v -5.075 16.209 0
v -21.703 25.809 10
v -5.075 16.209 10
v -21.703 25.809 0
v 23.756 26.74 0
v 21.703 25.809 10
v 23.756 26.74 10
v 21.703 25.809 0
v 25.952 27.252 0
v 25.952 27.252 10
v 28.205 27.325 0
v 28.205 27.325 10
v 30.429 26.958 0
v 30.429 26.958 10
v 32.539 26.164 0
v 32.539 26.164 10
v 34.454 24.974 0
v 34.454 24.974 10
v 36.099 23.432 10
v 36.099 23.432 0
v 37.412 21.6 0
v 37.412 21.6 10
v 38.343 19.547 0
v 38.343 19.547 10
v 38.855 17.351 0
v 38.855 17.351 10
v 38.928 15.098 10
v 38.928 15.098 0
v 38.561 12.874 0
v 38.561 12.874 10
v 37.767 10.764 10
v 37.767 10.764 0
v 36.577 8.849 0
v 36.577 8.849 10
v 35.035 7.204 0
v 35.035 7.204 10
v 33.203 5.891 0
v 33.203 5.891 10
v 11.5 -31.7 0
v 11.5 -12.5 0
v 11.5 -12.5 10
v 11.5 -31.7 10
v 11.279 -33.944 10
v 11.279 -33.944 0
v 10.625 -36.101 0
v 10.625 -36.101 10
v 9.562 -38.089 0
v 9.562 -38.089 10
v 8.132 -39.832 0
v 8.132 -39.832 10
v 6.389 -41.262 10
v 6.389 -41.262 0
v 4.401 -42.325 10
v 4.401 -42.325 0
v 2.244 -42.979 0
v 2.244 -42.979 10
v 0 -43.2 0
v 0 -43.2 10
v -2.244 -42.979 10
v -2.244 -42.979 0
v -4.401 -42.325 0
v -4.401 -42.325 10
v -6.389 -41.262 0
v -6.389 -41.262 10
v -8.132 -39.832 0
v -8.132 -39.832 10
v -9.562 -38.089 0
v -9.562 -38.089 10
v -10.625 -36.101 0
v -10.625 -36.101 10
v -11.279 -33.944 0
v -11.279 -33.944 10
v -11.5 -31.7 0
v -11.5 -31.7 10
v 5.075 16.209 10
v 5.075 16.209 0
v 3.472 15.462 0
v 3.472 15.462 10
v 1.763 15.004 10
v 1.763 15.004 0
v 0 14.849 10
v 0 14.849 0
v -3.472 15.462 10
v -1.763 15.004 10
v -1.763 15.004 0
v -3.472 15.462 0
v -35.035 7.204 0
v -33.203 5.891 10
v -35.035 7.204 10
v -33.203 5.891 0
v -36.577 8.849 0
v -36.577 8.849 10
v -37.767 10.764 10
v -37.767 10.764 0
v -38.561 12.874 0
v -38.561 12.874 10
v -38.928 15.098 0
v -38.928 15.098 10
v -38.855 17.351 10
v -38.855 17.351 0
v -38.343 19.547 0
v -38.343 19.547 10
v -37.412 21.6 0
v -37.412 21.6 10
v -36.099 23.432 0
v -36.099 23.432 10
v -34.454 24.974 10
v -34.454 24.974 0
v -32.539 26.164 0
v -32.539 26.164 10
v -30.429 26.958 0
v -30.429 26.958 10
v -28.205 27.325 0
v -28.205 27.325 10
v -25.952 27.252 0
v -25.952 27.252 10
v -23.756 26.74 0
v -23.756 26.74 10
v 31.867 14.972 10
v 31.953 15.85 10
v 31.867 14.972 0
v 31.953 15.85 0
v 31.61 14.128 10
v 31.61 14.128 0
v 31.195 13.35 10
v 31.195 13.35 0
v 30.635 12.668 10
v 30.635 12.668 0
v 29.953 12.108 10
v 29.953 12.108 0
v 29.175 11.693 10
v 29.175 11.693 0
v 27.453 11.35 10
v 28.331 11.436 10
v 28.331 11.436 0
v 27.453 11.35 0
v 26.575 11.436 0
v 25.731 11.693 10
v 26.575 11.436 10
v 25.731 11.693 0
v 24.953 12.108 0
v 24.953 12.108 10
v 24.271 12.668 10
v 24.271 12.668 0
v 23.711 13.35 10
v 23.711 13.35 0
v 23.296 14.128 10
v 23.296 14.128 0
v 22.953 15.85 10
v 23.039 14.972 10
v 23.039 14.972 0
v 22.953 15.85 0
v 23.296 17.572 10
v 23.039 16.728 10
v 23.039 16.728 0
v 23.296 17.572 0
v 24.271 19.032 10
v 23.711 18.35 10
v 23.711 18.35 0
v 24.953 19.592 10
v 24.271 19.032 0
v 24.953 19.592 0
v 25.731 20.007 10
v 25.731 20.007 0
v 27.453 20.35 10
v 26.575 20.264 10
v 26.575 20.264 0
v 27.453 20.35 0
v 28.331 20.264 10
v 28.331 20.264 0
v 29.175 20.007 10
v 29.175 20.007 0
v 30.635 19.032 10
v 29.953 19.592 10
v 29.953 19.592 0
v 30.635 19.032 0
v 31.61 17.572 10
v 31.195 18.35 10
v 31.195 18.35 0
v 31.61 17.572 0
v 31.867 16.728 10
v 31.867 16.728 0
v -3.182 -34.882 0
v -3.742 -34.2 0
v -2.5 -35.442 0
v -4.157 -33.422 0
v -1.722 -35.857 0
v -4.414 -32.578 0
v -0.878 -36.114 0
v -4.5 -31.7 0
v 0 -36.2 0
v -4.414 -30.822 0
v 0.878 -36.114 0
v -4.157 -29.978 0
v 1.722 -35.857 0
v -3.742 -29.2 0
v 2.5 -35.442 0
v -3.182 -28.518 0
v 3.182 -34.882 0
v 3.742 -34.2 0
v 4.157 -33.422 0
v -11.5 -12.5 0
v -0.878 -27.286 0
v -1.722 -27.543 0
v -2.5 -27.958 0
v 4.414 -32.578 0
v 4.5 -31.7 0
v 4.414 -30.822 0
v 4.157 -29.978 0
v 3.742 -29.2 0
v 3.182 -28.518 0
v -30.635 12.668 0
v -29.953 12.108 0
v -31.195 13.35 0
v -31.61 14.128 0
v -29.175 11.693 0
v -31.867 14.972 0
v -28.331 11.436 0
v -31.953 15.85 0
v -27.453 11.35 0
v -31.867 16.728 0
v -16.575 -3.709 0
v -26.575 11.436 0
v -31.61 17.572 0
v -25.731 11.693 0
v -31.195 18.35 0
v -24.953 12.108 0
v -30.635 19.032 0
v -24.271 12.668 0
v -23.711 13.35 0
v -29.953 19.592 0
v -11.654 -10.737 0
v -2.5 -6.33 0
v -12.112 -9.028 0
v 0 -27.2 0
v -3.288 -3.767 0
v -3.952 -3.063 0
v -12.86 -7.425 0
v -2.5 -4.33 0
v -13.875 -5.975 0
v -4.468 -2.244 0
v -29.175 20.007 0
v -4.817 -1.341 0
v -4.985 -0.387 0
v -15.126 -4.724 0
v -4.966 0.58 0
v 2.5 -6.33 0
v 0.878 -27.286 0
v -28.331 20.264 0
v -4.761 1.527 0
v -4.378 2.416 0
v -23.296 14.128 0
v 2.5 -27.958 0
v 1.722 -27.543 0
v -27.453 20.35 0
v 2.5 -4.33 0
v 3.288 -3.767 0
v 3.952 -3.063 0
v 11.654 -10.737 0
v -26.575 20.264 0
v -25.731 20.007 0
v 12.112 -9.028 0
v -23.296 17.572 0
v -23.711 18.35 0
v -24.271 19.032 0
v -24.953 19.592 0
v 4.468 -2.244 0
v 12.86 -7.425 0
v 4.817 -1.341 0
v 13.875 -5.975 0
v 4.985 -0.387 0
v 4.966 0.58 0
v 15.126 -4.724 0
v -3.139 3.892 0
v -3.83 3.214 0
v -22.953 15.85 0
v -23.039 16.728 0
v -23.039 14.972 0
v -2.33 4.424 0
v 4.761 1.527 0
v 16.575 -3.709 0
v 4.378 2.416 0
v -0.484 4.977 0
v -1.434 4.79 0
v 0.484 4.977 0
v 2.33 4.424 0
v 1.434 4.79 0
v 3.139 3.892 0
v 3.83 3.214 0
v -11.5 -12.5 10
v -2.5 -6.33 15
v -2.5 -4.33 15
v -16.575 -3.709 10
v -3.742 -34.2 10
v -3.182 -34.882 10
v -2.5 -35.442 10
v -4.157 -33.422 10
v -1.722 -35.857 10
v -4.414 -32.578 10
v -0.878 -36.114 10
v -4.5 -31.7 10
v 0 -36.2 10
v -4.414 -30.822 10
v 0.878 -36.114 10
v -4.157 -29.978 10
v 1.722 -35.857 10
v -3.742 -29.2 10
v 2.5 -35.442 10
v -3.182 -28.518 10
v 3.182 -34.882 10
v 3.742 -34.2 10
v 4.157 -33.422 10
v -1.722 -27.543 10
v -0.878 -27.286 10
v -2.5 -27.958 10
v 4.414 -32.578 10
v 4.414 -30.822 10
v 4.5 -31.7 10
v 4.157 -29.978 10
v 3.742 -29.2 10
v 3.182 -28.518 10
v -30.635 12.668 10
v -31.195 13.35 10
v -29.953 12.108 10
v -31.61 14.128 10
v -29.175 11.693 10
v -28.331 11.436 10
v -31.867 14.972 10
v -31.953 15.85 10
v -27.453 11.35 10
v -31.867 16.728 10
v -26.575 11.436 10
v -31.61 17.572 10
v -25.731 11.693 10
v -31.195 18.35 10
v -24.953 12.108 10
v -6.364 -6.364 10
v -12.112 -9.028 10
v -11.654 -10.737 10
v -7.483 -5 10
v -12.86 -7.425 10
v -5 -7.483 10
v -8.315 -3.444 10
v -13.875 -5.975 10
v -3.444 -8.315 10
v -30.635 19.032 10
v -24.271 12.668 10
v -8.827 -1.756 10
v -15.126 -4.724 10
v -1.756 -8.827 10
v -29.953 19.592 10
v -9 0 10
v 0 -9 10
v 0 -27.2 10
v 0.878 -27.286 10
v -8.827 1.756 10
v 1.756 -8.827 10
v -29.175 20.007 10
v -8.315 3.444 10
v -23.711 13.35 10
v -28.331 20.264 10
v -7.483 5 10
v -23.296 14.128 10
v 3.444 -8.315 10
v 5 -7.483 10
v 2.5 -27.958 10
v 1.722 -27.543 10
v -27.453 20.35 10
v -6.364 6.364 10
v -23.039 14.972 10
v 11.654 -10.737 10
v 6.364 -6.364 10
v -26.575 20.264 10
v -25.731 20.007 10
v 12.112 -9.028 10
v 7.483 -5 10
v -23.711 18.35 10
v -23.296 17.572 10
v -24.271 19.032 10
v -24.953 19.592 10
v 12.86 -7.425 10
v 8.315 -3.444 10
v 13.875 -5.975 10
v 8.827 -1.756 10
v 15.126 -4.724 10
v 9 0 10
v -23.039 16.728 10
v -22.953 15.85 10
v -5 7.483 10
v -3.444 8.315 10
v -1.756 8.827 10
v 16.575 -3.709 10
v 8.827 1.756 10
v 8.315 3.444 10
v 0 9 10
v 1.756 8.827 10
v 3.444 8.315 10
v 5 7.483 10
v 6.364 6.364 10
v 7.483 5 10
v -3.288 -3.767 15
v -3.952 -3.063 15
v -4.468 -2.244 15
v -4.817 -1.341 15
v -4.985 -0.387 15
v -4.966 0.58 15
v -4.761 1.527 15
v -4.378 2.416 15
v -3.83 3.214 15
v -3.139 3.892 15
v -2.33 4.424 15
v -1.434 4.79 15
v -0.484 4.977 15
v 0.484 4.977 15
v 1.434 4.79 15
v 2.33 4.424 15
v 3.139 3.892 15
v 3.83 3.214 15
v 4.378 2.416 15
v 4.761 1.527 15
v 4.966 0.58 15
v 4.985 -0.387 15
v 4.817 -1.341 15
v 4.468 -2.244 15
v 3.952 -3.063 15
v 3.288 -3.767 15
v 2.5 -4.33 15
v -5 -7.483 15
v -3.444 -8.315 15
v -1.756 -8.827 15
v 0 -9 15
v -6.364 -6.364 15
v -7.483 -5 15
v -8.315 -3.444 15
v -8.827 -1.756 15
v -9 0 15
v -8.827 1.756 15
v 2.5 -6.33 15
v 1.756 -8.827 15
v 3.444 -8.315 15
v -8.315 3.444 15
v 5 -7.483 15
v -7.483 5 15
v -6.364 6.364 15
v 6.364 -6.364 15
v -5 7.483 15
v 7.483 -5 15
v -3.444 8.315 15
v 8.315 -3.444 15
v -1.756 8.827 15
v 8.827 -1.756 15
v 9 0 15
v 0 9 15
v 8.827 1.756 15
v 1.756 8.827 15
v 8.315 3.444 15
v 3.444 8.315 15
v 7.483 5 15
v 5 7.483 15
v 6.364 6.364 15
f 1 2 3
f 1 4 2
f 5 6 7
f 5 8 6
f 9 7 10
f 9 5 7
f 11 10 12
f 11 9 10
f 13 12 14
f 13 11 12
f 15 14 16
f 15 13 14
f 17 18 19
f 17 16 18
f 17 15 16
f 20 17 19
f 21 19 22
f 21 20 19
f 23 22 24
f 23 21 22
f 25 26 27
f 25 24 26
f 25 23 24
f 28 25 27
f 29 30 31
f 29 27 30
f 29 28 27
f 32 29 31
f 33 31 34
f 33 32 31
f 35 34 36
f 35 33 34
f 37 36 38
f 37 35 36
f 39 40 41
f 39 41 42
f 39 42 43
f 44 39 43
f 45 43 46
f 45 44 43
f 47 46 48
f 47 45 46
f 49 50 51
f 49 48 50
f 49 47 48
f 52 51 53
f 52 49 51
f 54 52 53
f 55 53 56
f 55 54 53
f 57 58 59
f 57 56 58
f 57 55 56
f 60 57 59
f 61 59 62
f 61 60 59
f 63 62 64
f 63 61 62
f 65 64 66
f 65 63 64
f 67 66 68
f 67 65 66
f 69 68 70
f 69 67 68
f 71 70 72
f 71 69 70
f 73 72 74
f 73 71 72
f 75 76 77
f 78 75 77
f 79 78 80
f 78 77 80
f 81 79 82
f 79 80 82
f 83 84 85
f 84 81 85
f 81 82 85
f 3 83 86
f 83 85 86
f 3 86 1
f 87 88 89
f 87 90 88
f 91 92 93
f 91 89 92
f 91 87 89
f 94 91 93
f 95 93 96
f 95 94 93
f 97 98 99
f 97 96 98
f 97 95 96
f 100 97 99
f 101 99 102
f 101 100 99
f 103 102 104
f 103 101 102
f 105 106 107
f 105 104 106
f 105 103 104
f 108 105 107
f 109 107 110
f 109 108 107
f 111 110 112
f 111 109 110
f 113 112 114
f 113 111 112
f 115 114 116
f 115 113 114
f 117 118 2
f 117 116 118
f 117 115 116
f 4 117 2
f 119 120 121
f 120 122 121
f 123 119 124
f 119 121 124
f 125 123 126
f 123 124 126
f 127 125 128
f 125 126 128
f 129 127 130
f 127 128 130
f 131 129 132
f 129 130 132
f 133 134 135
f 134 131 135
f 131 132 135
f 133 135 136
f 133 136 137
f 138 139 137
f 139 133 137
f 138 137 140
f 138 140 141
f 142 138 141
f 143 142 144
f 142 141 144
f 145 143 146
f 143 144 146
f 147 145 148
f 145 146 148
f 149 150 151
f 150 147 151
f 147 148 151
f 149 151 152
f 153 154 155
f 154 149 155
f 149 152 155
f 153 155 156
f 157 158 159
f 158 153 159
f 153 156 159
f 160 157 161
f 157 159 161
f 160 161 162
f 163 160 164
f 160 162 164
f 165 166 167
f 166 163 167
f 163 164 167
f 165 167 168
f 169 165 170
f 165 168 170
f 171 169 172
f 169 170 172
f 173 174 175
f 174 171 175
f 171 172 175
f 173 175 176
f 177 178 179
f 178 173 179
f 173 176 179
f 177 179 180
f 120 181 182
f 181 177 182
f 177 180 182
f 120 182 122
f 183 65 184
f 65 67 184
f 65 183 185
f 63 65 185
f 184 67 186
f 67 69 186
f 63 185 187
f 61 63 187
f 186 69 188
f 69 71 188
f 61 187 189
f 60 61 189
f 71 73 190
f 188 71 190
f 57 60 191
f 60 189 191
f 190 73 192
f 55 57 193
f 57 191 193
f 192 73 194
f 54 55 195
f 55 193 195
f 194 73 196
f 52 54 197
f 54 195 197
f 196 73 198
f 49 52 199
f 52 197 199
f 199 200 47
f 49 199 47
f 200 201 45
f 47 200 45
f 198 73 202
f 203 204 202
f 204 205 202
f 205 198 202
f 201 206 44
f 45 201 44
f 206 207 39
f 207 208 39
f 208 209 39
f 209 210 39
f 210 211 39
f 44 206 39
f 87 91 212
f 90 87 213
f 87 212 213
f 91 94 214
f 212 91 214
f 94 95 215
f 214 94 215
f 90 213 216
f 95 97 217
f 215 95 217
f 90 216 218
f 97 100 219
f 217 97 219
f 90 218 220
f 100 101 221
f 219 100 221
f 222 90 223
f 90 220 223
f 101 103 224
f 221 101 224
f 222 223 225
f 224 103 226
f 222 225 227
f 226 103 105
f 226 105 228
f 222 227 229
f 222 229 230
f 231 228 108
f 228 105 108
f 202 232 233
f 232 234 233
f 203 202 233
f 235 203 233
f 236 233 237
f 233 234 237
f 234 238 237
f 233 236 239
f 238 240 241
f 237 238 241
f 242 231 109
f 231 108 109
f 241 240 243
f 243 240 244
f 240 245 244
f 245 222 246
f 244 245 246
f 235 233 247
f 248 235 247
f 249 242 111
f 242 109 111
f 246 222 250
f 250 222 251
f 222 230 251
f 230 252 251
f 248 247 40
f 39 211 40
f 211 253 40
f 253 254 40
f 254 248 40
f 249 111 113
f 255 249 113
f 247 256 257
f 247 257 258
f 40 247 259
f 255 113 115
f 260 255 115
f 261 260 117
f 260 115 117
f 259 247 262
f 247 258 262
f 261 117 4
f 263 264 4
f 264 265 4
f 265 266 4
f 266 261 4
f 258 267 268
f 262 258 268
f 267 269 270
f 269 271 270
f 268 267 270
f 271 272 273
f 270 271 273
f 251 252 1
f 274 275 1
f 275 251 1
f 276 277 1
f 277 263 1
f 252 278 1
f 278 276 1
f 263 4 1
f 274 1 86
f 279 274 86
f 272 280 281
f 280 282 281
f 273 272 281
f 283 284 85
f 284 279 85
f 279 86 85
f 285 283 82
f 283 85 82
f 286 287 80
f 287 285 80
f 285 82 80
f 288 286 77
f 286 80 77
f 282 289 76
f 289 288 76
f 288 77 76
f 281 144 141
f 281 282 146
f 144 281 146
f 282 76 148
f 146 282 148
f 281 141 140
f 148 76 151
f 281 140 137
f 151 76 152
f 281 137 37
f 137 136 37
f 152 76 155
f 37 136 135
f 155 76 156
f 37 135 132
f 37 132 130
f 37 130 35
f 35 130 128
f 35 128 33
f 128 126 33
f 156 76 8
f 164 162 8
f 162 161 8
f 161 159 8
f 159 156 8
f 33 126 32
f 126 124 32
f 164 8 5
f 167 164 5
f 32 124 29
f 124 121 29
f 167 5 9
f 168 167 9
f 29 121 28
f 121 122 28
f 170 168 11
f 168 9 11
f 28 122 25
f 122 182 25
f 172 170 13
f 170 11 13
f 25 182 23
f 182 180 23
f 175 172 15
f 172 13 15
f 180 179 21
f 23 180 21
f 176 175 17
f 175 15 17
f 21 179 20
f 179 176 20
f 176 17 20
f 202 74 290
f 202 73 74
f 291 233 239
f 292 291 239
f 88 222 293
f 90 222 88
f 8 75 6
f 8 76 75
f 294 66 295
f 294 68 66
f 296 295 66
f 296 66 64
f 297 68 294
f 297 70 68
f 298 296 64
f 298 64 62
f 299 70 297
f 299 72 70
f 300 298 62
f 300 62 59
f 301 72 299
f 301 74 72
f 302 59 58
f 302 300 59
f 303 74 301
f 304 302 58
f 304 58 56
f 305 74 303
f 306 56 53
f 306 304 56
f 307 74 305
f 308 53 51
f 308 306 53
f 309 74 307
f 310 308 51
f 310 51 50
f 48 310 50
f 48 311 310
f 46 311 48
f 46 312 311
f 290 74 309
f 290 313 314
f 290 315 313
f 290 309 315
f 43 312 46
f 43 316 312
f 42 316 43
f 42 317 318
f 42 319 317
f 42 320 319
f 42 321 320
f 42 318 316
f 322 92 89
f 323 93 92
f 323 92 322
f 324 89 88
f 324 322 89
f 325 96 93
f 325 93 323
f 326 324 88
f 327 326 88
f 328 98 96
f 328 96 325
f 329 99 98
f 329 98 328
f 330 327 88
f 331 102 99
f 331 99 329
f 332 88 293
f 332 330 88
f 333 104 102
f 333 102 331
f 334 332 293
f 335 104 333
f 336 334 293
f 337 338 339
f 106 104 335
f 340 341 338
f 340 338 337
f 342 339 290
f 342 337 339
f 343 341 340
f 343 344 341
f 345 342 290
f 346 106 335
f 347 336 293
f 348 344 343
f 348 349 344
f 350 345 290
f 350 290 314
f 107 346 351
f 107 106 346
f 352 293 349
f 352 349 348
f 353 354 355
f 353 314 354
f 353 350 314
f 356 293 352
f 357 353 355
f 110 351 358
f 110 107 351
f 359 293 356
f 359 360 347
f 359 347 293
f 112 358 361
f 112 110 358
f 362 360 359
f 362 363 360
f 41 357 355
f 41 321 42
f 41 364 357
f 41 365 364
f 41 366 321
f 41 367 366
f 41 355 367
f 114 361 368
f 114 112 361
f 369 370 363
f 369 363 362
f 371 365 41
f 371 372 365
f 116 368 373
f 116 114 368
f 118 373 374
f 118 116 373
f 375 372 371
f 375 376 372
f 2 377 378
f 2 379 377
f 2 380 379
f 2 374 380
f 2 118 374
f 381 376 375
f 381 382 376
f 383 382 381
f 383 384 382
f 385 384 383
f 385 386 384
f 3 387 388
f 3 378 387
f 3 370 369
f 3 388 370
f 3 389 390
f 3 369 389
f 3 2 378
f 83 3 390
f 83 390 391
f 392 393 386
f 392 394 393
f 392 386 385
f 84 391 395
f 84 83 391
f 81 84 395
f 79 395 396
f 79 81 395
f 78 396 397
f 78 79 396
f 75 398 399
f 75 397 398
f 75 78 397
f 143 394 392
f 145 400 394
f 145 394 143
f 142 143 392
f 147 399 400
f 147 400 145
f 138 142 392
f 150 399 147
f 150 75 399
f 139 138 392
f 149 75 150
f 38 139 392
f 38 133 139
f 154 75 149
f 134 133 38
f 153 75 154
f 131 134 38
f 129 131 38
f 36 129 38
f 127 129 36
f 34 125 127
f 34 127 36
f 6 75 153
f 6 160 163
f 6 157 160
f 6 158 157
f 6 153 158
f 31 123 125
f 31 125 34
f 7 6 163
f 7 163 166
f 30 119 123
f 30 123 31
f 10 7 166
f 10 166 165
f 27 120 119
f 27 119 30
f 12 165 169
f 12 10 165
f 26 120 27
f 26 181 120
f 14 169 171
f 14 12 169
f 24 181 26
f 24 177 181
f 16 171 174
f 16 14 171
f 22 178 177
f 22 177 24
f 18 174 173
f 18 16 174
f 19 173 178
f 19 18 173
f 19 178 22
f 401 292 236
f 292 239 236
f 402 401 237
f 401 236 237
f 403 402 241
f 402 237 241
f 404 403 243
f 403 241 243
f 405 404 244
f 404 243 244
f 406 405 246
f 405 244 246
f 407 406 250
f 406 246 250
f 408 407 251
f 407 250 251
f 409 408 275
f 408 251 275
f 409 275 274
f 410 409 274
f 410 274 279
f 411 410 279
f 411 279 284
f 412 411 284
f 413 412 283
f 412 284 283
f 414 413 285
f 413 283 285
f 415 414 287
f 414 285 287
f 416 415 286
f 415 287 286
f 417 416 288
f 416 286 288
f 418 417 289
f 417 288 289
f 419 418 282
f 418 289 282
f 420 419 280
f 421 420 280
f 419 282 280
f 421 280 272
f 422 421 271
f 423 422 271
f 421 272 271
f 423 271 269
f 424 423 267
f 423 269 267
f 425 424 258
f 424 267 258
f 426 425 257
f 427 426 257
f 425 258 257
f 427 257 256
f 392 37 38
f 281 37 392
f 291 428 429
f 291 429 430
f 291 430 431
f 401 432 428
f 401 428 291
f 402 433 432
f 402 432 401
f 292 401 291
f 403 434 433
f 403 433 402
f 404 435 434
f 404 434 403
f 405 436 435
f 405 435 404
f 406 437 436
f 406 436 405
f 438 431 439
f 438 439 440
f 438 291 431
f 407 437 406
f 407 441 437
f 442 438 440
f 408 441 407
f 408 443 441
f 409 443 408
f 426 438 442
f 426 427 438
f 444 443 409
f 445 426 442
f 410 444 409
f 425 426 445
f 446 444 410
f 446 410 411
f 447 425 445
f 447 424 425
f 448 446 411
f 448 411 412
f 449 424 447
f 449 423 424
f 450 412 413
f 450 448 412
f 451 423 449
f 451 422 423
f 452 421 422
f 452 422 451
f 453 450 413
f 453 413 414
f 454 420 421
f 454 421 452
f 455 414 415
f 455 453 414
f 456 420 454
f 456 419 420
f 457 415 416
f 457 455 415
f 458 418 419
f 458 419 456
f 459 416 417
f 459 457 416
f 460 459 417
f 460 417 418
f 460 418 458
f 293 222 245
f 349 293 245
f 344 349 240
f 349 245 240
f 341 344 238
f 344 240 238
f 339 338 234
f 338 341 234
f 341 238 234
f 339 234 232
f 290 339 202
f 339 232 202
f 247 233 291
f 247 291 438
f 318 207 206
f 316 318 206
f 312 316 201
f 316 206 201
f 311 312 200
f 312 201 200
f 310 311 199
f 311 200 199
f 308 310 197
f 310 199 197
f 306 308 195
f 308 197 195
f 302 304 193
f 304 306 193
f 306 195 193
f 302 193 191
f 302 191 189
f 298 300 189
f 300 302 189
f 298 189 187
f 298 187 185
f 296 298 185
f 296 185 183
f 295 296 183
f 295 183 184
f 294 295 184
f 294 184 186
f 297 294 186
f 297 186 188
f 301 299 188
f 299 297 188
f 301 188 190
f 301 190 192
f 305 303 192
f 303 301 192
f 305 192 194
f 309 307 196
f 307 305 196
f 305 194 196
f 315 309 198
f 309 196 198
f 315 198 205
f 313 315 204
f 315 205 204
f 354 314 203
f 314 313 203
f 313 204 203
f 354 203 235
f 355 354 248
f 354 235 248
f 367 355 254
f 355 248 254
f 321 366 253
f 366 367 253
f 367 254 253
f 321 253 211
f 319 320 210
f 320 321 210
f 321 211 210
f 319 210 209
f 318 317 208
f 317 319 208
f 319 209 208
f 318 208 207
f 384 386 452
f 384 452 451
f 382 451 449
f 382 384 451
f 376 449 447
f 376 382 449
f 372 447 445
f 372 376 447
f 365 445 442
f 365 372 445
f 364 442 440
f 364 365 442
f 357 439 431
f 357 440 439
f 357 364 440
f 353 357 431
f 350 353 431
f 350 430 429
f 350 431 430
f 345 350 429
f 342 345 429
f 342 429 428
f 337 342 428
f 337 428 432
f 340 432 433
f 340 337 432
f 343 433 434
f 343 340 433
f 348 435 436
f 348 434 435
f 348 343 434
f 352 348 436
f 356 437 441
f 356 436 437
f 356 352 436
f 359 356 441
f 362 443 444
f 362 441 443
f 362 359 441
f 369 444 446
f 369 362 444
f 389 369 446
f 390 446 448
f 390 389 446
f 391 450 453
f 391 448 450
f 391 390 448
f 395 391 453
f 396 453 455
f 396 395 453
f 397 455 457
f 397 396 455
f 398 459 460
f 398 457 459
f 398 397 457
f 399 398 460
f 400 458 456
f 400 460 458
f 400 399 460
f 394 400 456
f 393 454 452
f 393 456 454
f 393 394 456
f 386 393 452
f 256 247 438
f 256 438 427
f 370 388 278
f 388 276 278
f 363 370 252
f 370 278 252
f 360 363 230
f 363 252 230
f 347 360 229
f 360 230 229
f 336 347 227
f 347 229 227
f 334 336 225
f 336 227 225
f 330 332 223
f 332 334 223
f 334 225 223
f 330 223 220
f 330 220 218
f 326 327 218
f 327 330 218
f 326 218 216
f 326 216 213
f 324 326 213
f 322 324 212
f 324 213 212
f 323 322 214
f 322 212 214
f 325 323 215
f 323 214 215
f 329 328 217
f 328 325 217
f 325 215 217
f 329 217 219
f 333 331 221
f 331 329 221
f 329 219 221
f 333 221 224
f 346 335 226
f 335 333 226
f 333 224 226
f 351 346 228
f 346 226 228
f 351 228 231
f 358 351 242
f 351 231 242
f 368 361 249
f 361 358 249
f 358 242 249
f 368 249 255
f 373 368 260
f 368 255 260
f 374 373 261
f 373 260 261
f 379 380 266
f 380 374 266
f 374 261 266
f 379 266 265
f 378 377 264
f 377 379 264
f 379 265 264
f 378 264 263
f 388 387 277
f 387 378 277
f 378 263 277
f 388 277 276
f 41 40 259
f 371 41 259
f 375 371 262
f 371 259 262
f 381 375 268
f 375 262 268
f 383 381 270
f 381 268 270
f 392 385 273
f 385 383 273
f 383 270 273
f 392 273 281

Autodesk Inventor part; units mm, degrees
ref_plane "YZ Plane" through (0, 0, 0) normal (1, 0, 0) x (0, 1, 0)
ref_plane "XZ Plane" through (0, 0, 0) normal (0, 1, 0) x (-1, 0, 0)
ref_plane "XY Plane" through (0, 0, 0) normal (0, 0, 1) x (1, 0, 0)
sketch "草圖1" plane through (0, 0, 0) normal (0, 0, 1) x (1, 0, 0)
  line L0 (0, 0) -> (-27.453, 15.85) construction
  line L1 (0, 0) -> (0, -31.7) construction
  circle A0 centre (27.453, 15.85) radius 4.5
  circle A1 centre (0, -31.7) radius 4.5
  circle A2 centre (-27.453, 15.85) radius 4.5
  line L2 (-21.703, 25.8093) -> (-5.0753, 16.2093)
  arc A3 (-5.0753, 16.2093) -> (5.0753, 16.2093) centre (0, 25) ccw
  line L3 (5.0753, 16.2093) -> (21.703, 25.8093)
  line L4 (21.703, 25.8093) -> (21.703, 25.8093)
  arc A4 (33.203, 5.8907) -> (21.703, 25.8093) centre (27.453, 15.85) ccw
  line L5 (33.203, 5.8907) -> (16.5753, -3.7093)
  arc A5 (16.5753, -3.7093) -> (11.5, -12.5) centre (21.6506, -12.5) ccw
  line L6 (11.5, -12.5) -> (11.5, -31.7)
  arc A6 (-11.5, -31.7) -> (11.5, -31.7) centre (0, -31.7) ccw
  line L7 (-11.5, -31.7) -> (-11.5, -12.5)
  arc A7 (-11.5, -12.5) -> (-16.5753, -3.7093) centre (-21.6506, -12.5) ccw
  line L8 (-16.5753, -3.7093) -> (-33.203, 5.8907)
  arc A8 (-21.703, 25.8093) -> (-33.203, 5.8907) centre (-27.453, 15.85) ccw
  line L9 (0, 0) -> (27.453, 15.85) construction
  circle A9 centre (0, 0) radius 8
  dimension "d0" = 31.7
  dimension "d4" = 120
  dimension "d5" = 31.7
  dimension "d6" = 9
  dimension "d7" = 9
  dimension "d8" = 9
  dimension "d9" = 7
  dimension "d10" = 7
  dimension "d11" = 7
  dimension "d12" = 31.7
  dimension "d13" = 120
  dimension "d35" = 25
  dimension "d38" = 16
extrude "擠出1" add sketch "草圖1" along normal blind 10 contours L2 A3 L3 A4 L5 A5 L6 A6 L7 A7 L8 A8 | A9
sketch "草圖2" plane through (0, 0, 10) normal (0, 0, 1) x (1, 0, 0)
  circle A0 centre (0, 0) radius 5
  circle A1 centre (0, 0) radius 9
  line L0 (-2.5, -6.3301) -> (2.5, -6.3301)
  line L1 (-2.5, -6.3301) -> (-2.5, -4.3301)
  line L2 (2.5, -6.3301) -> (2.5, -4.3301)
  dimension "d41" = 10
  dimension "d42" = 18
  dimension "d45" = 5
  dimension "d46" = 2
extrude "擠出2" cut sketch "草圖2" against normal through all contours A0 | A0 L2 L0 L1
extrude "擠出3" add sketch "草圖2" along normal blind 5
equation "\"d0\" = d5"
equation "\"d6\" = d8"
equation "\"d7\" = d8"
equation "\"d10\" = d9"
equation "\"d11\" = d9"
equation "\"d12\" = d5"
properties part number "carrier2"
